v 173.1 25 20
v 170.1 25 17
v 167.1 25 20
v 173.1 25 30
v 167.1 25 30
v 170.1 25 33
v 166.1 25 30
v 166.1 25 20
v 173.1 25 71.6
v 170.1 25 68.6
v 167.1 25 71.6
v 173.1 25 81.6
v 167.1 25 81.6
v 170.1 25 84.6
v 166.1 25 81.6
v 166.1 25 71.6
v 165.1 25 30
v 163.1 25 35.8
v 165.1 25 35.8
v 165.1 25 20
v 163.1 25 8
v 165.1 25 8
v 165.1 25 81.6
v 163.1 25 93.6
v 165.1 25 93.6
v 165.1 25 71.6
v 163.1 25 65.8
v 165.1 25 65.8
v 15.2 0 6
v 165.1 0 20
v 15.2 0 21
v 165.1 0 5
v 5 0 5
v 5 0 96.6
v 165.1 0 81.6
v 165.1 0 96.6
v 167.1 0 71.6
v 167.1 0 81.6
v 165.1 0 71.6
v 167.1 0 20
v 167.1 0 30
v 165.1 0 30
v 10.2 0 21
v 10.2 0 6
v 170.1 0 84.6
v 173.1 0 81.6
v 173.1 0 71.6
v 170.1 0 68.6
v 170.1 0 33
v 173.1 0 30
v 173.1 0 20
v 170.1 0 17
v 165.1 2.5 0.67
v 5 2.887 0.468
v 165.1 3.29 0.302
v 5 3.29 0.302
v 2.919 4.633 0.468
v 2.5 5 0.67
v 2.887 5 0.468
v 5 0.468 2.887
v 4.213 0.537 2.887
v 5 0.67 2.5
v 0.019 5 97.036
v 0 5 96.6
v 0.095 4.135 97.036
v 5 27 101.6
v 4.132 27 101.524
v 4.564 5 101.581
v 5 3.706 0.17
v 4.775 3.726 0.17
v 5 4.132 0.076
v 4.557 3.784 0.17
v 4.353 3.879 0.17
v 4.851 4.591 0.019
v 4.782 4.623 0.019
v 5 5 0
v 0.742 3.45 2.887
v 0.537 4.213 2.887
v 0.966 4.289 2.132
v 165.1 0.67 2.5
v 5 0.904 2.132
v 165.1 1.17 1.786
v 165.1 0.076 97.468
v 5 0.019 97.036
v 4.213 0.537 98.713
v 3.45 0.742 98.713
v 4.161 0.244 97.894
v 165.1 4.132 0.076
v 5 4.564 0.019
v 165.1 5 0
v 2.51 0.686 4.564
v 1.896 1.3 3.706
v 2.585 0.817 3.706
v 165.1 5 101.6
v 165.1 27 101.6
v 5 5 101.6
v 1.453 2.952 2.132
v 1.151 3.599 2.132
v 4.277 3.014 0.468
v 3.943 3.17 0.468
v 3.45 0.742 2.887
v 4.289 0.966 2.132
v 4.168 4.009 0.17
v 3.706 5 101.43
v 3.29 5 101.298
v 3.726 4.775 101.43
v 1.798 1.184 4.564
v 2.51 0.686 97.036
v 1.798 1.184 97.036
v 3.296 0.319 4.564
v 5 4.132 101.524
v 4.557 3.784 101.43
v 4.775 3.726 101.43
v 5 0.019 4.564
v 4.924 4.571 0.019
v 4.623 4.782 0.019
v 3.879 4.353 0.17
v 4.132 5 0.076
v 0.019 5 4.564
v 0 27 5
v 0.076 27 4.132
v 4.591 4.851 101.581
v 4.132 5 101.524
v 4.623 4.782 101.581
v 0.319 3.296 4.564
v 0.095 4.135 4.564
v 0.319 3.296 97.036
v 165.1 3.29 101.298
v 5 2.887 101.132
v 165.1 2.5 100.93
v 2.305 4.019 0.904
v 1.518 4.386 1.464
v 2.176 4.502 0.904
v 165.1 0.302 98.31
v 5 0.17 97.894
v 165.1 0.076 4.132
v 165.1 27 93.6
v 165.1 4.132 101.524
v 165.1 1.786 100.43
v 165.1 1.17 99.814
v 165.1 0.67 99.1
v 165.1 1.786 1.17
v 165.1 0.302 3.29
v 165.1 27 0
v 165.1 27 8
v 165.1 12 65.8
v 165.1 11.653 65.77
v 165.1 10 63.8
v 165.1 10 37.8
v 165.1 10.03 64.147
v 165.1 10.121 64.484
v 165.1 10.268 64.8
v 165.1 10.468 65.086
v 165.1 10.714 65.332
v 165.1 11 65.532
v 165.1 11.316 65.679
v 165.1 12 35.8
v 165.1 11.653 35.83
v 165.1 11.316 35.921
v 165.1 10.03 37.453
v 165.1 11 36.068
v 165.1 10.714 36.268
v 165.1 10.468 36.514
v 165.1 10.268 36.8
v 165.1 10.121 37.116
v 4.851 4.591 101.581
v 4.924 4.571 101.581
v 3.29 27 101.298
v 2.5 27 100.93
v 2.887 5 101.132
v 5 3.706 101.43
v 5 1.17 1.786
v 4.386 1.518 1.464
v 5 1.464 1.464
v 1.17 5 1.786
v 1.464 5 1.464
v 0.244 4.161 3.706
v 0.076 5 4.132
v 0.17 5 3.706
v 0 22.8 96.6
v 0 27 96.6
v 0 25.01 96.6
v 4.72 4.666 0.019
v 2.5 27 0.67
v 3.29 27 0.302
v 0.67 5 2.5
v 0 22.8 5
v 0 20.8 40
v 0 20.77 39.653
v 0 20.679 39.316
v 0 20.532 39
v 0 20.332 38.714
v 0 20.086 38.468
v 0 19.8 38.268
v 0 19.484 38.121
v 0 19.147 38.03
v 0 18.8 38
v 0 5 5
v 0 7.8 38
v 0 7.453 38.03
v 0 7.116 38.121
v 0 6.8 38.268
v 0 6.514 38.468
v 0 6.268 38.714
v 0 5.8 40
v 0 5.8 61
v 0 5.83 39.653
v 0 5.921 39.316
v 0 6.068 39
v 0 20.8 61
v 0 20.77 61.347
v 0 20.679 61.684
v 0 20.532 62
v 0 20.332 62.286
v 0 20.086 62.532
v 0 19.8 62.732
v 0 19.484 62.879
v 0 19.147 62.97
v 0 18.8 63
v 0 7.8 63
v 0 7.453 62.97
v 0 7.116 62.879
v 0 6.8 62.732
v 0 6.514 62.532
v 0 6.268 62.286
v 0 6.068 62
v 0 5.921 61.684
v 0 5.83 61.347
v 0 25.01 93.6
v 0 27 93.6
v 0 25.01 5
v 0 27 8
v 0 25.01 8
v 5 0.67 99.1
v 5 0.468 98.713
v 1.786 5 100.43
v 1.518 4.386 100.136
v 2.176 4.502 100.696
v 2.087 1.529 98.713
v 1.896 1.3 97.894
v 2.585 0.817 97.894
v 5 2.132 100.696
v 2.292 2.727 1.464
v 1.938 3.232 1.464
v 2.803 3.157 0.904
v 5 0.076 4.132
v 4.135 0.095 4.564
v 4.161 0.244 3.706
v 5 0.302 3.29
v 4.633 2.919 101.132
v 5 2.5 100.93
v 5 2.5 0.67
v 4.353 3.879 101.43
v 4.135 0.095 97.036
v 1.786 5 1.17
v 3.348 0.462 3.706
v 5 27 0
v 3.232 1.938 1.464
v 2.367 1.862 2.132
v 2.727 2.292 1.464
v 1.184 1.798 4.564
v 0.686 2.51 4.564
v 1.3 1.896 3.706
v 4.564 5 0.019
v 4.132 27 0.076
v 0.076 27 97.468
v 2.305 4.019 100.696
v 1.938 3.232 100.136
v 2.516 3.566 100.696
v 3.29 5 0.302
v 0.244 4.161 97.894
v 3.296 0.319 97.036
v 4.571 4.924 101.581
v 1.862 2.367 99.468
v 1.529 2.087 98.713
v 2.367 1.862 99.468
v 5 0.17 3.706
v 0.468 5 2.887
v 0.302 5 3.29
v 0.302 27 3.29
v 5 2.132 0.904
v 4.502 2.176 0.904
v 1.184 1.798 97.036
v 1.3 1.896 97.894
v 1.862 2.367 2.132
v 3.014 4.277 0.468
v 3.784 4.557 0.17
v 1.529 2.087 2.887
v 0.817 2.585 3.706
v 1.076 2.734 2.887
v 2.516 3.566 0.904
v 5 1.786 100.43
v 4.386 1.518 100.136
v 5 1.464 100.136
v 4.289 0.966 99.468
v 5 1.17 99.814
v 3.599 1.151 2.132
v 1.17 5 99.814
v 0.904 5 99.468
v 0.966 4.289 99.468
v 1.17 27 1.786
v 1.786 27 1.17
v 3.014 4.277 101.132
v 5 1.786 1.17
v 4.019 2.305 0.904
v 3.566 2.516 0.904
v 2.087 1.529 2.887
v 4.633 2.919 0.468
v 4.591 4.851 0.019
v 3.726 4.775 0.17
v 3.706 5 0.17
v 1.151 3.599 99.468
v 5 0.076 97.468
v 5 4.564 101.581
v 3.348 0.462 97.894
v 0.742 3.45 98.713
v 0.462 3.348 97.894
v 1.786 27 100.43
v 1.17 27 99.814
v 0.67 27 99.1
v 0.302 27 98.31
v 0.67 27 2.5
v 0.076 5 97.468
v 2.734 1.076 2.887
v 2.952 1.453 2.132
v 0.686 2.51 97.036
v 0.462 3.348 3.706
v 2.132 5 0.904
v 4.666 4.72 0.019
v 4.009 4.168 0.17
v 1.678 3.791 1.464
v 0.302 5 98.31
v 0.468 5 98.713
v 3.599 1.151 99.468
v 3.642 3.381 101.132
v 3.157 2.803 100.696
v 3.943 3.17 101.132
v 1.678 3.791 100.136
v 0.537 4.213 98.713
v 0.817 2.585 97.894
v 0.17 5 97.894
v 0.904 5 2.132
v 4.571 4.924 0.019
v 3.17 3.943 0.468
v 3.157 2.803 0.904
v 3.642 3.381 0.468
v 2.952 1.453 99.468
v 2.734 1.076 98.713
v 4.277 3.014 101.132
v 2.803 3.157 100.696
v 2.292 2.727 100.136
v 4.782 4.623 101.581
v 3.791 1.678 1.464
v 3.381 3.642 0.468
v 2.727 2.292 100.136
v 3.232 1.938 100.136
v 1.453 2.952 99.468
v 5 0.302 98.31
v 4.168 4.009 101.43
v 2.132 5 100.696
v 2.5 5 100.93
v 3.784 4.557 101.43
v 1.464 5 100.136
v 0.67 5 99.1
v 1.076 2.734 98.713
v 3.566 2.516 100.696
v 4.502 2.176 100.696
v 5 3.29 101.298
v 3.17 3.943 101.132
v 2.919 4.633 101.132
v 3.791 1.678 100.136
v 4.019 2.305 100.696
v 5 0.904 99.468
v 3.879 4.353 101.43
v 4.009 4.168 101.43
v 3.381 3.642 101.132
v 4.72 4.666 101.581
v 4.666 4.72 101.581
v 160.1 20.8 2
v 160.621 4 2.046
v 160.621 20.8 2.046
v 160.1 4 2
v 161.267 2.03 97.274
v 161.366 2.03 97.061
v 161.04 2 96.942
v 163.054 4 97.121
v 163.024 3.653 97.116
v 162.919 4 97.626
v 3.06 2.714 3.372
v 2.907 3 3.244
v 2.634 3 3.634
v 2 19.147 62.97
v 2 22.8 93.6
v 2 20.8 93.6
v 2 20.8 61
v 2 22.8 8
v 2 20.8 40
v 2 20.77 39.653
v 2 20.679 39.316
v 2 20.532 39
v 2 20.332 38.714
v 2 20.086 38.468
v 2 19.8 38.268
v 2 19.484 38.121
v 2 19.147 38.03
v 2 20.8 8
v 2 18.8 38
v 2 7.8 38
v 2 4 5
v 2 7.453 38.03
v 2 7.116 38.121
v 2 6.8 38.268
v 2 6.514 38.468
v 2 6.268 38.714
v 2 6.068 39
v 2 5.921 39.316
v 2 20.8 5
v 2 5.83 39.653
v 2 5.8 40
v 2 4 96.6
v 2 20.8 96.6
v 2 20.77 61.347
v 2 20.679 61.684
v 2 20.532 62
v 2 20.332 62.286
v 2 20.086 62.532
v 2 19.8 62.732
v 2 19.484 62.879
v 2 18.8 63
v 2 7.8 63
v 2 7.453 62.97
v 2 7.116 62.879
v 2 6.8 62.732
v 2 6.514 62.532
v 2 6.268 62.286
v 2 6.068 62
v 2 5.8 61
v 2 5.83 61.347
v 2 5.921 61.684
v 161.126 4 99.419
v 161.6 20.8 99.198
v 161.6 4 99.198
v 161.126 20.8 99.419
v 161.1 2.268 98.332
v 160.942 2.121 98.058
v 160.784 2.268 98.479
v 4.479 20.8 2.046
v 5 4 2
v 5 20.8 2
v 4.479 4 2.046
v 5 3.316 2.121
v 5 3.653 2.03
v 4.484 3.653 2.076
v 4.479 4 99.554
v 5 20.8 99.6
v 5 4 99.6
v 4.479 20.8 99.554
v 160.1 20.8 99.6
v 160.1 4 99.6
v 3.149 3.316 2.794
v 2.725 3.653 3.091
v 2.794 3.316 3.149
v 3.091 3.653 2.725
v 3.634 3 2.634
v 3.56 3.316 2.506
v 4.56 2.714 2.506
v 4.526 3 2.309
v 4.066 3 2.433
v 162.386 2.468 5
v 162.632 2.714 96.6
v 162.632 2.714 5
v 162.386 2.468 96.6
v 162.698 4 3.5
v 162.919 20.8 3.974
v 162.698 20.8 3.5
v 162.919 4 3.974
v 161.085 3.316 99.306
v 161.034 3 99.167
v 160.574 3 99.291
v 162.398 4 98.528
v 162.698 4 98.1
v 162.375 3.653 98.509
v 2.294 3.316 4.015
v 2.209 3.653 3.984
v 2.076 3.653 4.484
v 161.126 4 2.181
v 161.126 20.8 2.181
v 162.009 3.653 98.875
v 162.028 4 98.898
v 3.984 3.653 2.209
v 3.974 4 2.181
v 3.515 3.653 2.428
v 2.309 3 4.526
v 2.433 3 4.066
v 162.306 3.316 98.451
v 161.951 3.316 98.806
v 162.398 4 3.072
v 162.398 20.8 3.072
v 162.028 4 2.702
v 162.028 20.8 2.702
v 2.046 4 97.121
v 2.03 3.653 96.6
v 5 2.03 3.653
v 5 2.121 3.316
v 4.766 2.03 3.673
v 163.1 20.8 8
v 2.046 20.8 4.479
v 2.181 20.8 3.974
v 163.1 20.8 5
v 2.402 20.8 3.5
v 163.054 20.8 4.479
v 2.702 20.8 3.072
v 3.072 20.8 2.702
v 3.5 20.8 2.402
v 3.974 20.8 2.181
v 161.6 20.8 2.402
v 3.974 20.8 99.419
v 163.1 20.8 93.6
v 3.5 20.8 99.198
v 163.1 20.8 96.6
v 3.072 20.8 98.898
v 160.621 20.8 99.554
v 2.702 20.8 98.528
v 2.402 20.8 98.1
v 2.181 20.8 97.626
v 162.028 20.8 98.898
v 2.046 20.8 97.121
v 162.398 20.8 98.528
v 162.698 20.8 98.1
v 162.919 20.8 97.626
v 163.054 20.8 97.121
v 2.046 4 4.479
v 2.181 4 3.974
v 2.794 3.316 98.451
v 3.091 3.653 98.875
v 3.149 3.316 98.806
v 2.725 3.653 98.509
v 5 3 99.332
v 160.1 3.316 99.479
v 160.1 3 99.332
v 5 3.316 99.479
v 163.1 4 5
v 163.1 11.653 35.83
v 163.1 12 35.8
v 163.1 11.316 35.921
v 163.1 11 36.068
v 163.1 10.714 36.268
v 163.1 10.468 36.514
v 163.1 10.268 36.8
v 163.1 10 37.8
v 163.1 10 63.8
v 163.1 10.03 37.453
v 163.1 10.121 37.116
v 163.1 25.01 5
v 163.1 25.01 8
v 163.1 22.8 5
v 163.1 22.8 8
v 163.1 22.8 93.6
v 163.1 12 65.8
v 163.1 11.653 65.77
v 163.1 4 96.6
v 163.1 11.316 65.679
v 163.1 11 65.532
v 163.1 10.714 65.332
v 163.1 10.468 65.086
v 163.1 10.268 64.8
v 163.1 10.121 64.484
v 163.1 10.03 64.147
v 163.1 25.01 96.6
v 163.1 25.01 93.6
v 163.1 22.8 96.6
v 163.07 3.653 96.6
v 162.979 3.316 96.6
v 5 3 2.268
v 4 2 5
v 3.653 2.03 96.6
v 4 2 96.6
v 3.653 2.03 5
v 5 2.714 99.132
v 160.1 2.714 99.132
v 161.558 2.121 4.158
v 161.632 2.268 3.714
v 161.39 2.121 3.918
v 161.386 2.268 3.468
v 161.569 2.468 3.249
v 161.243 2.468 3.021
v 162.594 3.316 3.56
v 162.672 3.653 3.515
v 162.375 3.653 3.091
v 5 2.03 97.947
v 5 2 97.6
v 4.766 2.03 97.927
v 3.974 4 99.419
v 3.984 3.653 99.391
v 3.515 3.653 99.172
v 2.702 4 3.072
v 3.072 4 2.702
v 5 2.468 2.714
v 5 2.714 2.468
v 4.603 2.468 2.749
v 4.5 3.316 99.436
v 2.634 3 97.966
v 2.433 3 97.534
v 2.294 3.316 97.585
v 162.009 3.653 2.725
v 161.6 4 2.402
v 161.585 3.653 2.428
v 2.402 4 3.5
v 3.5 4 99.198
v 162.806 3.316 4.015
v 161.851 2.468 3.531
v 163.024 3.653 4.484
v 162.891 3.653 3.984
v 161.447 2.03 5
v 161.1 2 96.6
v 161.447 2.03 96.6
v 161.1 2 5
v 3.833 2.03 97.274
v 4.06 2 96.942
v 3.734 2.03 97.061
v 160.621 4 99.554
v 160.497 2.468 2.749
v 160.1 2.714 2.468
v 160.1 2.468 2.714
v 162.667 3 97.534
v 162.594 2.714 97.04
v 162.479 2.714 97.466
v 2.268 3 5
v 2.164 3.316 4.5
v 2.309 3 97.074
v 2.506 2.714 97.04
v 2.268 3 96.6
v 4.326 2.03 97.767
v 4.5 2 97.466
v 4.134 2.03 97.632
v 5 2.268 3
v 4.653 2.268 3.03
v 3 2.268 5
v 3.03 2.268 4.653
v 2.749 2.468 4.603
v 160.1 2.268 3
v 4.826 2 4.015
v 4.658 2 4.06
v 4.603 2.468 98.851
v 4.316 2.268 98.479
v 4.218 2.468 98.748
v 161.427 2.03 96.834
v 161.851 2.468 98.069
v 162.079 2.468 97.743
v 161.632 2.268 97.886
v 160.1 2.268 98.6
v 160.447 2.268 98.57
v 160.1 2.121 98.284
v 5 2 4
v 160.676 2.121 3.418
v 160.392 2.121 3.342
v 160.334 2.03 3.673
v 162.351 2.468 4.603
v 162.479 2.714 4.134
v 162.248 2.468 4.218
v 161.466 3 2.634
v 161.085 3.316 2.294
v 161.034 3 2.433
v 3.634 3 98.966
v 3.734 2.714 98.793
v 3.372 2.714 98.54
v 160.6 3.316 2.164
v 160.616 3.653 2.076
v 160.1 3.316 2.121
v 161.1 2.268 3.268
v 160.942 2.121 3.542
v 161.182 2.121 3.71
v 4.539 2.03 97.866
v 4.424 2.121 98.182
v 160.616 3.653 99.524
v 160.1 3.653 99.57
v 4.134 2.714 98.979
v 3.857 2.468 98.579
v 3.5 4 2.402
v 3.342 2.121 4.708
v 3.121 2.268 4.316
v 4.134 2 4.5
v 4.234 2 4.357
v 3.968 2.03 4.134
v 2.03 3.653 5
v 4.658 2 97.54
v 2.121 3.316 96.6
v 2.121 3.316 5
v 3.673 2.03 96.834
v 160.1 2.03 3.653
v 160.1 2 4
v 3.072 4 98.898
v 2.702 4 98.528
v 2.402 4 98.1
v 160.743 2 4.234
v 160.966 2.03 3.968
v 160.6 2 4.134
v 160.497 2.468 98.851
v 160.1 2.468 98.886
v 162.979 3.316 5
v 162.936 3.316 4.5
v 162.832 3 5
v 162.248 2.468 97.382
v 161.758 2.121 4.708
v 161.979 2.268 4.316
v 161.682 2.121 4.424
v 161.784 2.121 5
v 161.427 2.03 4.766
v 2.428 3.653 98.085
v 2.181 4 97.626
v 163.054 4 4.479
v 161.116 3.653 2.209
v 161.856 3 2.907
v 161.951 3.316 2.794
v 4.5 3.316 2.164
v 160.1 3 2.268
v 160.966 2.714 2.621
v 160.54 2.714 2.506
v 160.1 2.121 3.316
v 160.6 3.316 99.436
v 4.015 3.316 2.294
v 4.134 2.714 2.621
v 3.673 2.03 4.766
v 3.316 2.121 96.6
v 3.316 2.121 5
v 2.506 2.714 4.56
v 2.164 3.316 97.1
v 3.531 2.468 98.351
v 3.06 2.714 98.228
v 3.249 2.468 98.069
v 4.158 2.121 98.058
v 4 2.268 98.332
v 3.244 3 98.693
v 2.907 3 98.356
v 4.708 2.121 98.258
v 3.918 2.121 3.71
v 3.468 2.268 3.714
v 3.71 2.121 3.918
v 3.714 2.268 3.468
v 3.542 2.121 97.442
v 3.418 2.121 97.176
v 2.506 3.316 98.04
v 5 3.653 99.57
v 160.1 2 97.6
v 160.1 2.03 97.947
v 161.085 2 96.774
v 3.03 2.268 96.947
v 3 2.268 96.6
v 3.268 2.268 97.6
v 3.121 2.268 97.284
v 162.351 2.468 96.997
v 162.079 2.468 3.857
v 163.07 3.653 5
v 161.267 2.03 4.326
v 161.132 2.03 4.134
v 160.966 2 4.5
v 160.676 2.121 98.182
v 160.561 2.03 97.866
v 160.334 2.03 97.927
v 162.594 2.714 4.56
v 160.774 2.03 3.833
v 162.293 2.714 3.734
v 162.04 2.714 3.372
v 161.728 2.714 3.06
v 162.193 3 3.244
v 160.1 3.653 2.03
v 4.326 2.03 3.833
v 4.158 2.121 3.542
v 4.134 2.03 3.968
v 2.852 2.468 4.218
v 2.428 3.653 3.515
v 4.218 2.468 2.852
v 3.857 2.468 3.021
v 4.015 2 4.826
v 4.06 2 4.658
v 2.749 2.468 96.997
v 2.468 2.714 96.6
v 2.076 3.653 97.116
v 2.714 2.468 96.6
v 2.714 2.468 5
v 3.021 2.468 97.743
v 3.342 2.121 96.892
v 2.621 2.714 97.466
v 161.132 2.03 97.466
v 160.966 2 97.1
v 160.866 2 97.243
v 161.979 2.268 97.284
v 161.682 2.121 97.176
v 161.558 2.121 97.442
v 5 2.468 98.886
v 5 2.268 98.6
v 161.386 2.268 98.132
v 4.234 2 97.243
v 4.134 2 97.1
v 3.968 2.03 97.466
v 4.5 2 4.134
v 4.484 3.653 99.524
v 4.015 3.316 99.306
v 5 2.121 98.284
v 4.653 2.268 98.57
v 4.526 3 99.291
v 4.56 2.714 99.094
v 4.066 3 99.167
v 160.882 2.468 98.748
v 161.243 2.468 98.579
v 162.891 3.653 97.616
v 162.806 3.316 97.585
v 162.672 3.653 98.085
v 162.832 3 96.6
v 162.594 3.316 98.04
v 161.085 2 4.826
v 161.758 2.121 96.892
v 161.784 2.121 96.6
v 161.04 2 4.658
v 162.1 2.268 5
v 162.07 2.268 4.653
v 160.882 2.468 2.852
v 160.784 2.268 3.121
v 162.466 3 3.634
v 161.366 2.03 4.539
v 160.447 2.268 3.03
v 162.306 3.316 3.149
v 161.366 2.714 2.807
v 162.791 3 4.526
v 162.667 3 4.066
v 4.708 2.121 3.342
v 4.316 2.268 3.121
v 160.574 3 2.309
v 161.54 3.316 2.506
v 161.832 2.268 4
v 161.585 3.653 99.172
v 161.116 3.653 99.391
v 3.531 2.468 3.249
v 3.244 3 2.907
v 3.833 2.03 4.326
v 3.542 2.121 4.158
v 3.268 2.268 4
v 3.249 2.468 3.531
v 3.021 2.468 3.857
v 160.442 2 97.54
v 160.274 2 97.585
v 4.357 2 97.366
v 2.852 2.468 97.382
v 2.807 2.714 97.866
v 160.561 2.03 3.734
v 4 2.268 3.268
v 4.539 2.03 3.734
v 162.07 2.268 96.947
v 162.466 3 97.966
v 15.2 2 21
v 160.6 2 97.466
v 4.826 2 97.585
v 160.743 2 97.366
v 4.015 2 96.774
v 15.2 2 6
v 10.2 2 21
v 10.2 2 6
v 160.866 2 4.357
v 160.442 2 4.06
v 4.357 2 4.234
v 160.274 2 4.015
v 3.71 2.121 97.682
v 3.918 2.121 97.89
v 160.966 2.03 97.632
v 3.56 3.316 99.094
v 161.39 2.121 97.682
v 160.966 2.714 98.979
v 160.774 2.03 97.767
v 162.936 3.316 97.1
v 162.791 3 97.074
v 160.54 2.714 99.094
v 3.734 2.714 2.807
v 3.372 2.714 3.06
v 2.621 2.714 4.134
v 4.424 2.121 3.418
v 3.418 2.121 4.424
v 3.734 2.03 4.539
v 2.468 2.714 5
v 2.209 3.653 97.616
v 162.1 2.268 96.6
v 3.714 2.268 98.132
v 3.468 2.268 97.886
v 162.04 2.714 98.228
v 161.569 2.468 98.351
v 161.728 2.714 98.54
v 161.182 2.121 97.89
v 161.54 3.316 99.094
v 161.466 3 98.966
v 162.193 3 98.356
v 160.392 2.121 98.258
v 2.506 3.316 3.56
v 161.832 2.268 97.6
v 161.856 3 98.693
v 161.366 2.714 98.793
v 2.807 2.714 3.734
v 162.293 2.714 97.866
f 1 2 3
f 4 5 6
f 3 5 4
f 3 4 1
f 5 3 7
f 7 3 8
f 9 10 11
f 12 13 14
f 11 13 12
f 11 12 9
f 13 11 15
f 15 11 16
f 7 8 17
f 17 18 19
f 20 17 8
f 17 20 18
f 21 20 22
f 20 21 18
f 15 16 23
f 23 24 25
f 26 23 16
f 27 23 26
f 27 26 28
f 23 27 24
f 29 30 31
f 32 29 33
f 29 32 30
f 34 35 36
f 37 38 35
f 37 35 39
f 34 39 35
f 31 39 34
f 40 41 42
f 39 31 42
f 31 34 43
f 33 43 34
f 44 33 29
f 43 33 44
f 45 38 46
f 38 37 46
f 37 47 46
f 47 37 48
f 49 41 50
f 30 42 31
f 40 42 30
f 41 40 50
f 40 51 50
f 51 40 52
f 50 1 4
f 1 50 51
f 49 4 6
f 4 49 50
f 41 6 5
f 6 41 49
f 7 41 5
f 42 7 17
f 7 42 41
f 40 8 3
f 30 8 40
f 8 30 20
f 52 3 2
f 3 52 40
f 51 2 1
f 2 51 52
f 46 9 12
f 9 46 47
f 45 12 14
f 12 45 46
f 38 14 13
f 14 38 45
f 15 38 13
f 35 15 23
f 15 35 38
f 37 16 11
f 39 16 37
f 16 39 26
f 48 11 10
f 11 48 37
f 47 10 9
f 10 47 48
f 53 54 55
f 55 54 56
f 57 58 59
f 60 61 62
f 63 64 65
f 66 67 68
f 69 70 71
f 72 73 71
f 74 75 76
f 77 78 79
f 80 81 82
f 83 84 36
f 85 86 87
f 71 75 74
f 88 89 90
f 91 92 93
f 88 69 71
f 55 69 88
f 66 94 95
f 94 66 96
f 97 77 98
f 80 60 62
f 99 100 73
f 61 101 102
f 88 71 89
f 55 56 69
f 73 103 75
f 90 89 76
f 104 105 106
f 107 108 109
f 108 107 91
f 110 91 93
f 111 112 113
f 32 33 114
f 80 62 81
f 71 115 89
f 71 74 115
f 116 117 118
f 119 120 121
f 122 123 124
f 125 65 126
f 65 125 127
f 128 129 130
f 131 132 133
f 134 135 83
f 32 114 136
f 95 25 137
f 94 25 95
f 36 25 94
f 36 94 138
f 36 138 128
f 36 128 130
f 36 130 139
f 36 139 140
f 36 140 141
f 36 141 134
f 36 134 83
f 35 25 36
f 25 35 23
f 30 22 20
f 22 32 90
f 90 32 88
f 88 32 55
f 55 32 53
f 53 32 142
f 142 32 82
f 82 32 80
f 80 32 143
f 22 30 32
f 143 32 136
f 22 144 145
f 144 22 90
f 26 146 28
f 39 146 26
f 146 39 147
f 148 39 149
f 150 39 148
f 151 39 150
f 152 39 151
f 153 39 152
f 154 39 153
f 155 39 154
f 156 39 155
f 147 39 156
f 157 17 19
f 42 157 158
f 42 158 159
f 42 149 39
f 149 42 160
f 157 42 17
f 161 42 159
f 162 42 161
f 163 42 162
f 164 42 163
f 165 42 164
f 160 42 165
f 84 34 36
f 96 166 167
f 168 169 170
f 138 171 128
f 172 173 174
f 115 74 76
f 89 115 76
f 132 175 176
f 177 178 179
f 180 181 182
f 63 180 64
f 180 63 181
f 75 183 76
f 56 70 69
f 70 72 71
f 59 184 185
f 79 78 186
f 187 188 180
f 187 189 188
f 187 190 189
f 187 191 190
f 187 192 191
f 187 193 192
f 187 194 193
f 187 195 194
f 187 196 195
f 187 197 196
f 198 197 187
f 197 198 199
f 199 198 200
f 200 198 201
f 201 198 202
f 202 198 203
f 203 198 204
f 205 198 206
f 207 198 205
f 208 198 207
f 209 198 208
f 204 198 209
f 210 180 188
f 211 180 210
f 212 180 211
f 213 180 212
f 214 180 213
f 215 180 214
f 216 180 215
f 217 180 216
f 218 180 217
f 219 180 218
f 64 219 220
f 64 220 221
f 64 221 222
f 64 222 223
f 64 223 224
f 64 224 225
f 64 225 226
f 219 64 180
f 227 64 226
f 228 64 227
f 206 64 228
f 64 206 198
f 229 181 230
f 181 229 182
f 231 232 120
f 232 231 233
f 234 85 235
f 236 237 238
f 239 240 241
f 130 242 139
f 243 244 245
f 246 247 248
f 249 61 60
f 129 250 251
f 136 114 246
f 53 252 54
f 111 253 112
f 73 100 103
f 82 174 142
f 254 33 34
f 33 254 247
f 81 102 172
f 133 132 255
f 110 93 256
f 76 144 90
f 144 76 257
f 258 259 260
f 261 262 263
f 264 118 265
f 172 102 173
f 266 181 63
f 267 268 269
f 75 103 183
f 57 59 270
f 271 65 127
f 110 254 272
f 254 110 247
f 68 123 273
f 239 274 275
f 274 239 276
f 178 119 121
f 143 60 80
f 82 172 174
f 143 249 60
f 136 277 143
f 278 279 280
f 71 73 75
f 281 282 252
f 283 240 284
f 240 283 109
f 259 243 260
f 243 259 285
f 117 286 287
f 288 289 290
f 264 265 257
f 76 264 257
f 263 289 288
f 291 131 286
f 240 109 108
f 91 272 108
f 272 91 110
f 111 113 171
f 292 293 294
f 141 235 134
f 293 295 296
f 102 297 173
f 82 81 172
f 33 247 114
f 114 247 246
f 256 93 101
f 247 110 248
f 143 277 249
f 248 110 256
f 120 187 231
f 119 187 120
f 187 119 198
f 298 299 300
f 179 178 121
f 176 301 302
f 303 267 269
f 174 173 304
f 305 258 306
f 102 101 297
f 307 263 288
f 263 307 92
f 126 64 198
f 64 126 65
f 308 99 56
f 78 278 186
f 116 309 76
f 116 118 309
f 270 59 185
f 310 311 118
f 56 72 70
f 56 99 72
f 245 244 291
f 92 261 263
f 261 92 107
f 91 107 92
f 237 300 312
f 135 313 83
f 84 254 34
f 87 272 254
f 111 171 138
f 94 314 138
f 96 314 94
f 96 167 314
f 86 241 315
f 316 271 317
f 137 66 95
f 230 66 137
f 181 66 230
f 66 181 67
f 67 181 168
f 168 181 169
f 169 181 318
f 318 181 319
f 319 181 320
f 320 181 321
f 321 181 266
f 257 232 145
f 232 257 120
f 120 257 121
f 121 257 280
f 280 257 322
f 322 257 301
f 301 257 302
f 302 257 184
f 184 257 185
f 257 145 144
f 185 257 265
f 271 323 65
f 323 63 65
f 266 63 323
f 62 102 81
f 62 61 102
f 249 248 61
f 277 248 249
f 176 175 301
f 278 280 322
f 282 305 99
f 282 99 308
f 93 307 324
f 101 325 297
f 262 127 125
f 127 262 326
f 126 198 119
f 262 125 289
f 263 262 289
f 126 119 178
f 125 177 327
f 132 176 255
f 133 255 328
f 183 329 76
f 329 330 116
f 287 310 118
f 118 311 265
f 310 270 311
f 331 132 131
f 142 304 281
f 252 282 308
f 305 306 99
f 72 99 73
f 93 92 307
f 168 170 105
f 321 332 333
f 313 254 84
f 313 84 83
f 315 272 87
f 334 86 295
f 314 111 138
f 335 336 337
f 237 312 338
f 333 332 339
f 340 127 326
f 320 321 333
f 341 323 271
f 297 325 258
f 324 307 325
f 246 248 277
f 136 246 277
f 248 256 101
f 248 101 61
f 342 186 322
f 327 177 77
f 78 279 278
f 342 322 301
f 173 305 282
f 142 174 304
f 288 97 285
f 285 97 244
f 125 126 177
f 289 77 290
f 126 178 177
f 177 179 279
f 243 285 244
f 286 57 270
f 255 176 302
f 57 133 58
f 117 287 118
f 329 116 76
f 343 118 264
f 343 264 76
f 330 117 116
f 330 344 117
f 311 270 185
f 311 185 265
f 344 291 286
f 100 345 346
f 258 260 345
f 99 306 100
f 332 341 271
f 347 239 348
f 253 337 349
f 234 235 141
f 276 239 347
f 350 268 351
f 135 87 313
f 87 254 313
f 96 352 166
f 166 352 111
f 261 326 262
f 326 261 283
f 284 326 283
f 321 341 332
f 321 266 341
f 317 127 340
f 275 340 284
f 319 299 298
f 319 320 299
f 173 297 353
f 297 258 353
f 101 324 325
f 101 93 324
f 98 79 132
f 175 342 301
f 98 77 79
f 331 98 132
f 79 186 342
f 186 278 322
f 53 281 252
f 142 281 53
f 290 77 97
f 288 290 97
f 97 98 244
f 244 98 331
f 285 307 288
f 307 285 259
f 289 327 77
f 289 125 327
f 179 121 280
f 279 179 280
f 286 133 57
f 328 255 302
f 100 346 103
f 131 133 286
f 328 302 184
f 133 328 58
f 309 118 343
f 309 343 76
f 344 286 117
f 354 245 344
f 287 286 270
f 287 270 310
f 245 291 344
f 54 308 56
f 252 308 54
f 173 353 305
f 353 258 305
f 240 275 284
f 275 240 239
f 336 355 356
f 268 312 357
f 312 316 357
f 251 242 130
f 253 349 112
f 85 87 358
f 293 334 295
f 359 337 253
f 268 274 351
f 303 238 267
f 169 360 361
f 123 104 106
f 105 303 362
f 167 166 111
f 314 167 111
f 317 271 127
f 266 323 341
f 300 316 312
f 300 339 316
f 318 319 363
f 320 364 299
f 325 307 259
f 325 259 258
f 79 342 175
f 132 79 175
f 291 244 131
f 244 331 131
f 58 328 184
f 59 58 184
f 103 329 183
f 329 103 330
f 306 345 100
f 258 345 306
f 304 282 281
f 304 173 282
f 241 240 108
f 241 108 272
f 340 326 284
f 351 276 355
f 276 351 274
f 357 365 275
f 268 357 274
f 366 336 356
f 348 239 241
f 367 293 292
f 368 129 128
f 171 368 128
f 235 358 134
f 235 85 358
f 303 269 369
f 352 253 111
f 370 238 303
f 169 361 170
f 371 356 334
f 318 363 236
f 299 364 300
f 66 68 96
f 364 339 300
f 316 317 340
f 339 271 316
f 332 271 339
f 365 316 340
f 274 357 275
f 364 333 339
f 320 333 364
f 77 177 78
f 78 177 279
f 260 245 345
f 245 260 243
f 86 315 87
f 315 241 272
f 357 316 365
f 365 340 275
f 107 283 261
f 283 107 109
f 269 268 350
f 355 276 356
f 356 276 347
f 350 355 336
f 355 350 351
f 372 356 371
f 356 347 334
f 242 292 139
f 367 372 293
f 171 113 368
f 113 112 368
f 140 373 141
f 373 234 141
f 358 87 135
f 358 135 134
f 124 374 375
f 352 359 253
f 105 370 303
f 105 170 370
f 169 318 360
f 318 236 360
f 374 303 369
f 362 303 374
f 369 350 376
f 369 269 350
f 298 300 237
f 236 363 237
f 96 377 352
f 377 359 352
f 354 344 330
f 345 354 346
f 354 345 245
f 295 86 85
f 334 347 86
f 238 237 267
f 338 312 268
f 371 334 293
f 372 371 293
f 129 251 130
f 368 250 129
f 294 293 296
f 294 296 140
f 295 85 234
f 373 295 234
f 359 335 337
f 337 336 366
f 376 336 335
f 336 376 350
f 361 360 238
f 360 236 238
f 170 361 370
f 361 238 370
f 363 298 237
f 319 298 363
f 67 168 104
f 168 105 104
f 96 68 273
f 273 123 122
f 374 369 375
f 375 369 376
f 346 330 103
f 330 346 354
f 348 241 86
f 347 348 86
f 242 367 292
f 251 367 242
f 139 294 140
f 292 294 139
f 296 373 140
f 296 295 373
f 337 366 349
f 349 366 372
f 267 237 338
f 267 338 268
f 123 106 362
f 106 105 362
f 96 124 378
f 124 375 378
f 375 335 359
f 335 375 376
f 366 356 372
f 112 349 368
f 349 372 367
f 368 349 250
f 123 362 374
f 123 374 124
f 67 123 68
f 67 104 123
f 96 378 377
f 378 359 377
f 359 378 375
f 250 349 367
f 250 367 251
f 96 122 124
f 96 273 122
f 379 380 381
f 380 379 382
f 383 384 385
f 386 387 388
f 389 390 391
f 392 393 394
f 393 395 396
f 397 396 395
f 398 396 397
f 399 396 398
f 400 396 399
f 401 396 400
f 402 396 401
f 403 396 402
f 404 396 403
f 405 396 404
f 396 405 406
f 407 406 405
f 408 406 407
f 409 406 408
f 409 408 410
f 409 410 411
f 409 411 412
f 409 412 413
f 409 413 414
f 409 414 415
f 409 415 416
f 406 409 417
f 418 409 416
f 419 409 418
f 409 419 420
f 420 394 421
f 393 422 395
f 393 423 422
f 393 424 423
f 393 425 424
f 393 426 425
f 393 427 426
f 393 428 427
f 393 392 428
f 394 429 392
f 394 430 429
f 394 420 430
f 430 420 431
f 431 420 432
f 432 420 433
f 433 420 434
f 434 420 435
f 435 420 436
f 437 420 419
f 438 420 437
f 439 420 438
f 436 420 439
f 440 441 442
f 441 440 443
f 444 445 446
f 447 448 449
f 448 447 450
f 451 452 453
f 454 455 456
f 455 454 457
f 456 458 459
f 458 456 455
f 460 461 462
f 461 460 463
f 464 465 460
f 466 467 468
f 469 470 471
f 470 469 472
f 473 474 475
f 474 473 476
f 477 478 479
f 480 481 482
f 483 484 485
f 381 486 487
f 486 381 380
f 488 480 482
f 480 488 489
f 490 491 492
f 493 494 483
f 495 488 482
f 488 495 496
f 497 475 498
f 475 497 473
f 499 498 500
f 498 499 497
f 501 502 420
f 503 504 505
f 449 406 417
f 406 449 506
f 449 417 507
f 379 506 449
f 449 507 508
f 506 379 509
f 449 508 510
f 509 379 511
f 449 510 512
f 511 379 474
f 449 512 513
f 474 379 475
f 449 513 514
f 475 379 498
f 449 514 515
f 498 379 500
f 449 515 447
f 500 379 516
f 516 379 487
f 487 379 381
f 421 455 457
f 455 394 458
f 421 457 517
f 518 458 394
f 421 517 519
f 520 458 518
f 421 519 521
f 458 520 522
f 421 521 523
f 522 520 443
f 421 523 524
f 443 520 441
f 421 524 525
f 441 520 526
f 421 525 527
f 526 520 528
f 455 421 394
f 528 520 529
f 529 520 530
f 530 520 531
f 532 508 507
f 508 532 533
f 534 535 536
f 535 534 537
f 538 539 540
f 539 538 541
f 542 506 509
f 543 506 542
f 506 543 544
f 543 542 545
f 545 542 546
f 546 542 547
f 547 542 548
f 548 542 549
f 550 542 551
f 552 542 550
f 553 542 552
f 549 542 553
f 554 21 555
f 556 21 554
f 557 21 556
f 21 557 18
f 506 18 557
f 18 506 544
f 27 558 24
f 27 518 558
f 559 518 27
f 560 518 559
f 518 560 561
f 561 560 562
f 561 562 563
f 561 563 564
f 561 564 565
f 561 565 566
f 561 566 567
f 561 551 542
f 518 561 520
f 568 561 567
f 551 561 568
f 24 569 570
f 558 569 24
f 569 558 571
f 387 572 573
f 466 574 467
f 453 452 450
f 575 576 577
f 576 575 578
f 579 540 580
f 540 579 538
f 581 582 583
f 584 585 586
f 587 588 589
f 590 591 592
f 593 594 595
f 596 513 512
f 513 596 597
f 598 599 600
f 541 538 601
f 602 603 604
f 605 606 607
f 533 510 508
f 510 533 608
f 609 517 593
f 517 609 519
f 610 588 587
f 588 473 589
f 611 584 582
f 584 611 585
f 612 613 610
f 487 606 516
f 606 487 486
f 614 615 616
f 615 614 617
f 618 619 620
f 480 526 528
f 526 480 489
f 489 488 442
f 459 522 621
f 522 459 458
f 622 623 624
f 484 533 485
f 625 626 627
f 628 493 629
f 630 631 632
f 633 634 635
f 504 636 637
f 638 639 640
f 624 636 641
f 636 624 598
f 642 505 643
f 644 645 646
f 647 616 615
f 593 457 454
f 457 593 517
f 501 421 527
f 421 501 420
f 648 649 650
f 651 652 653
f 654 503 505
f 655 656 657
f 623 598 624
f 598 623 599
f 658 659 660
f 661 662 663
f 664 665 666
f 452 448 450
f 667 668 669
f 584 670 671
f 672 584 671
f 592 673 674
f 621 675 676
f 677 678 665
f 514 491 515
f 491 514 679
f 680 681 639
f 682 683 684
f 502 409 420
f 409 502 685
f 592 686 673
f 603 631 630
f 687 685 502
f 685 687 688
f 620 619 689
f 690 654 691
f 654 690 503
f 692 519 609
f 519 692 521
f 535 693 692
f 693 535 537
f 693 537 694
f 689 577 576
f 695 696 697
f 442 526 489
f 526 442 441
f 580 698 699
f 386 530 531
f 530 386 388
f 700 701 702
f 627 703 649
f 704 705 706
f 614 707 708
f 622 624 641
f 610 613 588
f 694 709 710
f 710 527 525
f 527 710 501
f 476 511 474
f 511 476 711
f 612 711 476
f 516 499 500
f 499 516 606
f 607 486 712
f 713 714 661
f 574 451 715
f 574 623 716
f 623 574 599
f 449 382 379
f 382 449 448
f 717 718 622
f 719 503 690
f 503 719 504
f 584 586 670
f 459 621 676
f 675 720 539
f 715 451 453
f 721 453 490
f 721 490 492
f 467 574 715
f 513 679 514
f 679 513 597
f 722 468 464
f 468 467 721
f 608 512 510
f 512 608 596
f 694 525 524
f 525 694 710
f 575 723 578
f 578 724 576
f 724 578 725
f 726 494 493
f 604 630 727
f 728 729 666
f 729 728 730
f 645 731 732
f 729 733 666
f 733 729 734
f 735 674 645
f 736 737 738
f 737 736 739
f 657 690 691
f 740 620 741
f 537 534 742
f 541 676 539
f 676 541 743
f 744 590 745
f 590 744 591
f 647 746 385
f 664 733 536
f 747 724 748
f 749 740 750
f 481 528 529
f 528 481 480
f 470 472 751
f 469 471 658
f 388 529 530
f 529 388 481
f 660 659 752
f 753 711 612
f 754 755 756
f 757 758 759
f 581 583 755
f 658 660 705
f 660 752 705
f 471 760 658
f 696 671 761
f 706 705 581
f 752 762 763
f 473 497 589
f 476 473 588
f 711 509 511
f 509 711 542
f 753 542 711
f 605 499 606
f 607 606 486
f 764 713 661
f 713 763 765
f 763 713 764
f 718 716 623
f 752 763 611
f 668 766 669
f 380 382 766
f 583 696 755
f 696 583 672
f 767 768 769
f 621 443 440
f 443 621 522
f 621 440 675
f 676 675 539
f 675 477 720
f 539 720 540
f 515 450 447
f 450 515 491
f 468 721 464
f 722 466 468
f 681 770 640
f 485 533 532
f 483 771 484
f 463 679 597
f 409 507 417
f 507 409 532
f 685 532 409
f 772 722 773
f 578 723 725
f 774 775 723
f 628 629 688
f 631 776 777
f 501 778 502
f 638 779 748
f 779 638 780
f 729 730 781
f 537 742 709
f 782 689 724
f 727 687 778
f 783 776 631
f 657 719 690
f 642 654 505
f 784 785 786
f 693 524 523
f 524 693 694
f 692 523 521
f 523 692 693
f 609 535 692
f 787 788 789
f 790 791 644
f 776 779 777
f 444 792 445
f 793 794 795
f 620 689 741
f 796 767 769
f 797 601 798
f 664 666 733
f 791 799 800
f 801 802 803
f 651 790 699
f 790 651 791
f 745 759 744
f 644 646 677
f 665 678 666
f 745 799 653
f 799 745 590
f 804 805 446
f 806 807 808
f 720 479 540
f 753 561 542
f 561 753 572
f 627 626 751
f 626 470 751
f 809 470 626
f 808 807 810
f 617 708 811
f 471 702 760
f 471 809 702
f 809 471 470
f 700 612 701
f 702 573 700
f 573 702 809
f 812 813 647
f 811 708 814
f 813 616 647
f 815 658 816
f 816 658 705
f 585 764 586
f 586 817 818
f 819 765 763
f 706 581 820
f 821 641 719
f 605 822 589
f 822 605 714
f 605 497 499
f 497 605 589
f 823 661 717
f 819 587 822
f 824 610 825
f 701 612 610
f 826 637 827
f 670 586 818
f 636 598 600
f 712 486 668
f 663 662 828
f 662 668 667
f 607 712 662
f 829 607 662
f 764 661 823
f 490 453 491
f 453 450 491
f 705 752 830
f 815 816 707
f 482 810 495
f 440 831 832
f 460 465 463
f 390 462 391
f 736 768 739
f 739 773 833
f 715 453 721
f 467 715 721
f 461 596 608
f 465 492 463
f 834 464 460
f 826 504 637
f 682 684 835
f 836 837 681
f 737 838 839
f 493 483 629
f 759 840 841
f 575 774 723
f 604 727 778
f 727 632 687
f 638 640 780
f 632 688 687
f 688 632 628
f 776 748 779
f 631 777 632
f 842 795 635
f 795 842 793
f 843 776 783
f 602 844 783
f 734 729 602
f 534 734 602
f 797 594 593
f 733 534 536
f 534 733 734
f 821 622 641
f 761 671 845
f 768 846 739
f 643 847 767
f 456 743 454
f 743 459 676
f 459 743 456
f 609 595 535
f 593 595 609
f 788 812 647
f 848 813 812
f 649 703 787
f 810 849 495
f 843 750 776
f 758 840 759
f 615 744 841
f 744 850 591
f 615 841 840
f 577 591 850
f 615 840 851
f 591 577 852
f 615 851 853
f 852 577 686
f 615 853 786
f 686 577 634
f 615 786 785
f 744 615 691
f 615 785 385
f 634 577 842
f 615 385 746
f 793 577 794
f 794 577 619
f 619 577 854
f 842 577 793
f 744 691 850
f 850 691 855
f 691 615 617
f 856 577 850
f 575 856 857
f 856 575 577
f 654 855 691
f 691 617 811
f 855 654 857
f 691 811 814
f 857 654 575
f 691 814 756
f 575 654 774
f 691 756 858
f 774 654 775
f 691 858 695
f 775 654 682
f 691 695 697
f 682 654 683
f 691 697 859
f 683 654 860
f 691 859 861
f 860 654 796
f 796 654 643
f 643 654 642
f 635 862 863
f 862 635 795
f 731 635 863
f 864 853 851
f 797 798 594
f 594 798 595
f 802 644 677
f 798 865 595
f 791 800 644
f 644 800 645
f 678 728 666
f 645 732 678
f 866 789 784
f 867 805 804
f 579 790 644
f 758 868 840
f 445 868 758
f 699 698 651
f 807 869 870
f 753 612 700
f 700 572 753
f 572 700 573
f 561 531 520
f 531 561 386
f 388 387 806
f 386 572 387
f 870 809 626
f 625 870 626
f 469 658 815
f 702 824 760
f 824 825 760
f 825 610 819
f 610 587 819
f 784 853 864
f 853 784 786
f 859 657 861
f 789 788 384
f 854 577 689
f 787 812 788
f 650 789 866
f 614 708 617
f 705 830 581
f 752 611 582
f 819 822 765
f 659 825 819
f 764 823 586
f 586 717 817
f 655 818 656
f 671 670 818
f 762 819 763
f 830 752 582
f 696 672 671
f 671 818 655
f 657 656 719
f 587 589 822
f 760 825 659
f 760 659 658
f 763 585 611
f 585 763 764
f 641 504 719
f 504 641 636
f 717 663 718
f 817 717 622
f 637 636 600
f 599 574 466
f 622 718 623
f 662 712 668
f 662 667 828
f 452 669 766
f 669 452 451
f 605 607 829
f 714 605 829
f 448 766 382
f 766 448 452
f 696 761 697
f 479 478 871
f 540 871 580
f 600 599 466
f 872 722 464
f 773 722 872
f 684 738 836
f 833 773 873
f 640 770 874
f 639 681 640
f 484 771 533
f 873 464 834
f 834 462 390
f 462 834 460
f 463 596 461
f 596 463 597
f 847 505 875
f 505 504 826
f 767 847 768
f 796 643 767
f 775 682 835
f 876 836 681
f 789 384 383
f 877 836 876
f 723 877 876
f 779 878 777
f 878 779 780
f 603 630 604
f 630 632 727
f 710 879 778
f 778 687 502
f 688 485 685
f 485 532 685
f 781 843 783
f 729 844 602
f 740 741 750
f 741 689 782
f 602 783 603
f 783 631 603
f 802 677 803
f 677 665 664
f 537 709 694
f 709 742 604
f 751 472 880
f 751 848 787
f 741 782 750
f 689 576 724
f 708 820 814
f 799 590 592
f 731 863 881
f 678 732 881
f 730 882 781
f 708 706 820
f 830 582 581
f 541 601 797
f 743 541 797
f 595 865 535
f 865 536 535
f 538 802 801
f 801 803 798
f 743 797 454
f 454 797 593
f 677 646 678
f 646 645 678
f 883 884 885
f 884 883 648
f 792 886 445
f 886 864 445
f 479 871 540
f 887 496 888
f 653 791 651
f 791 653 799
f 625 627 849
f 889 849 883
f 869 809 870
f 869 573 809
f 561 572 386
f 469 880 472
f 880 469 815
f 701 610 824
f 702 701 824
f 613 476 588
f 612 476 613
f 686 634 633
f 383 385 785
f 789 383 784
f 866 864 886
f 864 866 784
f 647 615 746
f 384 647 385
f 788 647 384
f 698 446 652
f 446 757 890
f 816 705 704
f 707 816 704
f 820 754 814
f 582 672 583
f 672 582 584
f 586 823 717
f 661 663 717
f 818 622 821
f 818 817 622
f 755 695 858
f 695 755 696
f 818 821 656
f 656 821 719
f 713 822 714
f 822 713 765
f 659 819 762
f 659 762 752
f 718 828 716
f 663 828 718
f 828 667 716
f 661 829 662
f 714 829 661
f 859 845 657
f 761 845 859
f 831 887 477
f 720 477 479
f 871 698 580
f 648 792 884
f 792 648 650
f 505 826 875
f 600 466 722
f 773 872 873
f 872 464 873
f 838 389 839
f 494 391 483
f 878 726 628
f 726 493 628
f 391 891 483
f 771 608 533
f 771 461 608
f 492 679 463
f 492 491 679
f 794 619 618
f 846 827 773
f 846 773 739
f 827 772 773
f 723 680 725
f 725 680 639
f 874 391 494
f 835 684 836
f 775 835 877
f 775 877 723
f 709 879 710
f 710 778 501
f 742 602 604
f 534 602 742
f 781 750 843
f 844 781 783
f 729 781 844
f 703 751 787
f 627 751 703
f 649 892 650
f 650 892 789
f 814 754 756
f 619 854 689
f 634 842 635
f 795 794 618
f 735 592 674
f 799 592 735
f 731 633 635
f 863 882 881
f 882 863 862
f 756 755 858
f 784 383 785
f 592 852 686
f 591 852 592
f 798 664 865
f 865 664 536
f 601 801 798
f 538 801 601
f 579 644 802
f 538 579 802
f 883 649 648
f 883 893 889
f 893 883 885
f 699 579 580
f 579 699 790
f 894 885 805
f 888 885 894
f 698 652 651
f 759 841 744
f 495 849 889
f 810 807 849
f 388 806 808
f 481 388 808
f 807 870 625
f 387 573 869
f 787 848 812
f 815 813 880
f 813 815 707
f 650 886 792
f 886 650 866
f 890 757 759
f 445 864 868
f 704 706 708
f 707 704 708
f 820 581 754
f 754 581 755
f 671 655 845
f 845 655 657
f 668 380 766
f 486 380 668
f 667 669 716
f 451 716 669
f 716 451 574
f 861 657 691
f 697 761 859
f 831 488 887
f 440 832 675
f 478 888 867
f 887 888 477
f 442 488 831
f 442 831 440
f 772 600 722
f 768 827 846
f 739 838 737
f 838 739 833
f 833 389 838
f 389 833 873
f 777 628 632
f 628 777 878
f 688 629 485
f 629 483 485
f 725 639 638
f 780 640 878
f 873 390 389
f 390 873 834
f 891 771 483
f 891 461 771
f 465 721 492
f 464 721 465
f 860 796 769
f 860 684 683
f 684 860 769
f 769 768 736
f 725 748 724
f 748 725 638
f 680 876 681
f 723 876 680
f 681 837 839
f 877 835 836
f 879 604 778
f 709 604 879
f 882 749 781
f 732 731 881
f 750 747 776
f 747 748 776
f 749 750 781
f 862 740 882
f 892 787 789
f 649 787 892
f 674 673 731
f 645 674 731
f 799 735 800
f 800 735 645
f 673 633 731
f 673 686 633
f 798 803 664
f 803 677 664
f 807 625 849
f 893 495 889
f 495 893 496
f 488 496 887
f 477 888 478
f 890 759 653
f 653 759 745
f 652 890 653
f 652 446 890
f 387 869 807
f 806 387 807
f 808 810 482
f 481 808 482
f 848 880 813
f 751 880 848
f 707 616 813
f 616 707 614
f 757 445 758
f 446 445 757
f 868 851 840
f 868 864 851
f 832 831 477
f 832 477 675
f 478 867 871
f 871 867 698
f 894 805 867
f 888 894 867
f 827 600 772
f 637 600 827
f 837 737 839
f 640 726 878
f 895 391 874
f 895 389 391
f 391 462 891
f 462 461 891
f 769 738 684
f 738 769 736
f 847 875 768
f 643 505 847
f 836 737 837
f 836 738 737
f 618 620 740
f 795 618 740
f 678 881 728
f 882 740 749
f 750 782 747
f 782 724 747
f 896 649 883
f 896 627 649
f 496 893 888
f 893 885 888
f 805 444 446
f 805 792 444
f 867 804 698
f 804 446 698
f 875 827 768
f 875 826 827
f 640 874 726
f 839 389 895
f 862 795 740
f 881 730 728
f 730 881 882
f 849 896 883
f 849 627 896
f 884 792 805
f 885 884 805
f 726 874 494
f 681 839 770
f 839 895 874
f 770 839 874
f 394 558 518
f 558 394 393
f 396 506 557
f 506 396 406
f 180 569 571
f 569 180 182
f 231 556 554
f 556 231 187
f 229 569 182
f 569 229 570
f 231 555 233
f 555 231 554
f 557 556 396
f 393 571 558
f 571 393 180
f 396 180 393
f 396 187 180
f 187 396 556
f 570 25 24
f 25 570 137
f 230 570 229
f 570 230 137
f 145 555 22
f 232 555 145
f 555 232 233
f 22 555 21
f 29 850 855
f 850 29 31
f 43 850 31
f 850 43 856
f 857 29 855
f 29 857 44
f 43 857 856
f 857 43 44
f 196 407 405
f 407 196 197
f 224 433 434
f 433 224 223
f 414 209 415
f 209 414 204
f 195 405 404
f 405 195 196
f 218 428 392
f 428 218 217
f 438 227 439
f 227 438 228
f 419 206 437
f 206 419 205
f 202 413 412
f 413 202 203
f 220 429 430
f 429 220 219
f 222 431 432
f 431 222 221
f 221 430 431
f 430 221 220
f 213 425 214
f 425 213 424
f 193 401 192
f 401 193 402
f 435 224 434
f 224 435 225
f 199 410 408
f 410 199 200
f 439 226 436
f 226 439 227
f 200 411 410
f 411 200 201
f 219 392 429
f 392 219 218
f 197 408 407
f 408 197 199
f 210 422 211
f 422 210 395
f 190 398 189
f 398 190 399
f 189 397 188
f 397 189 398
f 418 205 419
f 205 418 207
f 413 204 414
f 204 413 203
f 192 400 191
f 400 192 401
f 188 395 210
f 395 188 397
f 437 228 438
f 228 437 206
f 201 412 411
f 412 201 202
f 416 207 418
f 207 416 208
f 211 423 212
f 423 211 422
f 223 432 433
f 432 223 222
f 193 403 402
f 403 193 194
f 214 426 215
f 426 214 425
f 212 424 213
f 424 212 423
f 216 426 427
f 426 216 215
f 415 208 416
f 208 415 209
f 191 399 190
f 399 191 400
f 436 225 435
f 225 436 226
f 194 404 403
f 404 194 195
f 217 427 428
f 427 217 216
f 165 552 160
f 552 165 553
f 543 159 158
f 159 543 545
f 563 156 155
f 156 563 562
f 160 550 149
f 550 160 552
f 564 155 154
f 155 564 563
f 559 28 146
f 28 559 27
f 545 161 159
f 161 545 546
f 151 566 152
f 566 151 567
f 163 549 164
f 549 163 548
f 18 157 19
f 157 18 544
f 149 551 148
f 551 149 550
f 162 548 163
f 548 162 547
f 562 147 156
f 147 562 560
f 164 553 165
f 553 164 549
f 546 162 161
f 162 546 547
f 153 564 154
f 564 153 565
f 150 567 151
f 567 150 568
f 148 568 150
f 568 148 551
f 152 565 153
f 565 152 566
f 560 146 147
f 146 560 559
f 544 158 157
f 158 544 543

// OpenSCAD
// Side box (SolidWorks part 001), left/original copy. Holds one IR proximity
// sensor that reads through the window in the front face. The back door slides
// in from the open left end along the top/bottom grooves; the right end joins
// the center body with two dovetail tabs and a wire notch.
// Frame: X = width (left->right seen from the front), Y = depth (0 = front,
// facing the coffee pots; 27 = back/wall side), Z = height.

side_w = 165.1;          // box width (without joint tabs)
side_d = 27.0;           // box depth
side_h = 101.6;          // box height
side_r = 5.0;            // outer fillet on the front edges and the left end edges
side_wall = 2.0;         // wall thickness (front, top, bottom, left, right)
side_in_r_front = 2.0;   // inner fillet where the cavity meets the front wall
side_in_r_corner = 3.0;  // inner fillet on the cavity's X-Z corners (edges along Y)
side_fn = 36;            // facets per circle (the STL uses 36, i.e. 10 deg steps)

// Back: rail, door groove, lip (same at bottom and top, mirrored)
side_rail_y = 20.8;      // inner face of the rail (= back end of the rounded cavity)
side_rail_t = 2.0;       // rail thickness (Y)
side_rail_h = 8.0;       // rail/lip height from the outer bottom (top/bottom face)
side_groove_t = 2.2;     // door groove width (Y), 22.8..25
side_groove_h = 5.0;     // groove floor height from the outer bottom (3 deep into the 8 high rail)
side_lip_y = 25.0;       // back lip starts here (25..27); right wall also stops here

// Sensor window (front face, sharp rectangle straight through)
side_win_x = 10.2;
side_win_z = 6.0;
side_win_w = 5.0;
side_win_h = 15.0;

// Wire hole (left end wall, rounded rectangle)
side_wire_y = 5.8;
side_wire_z = 38.0;      // was 37.28 in SolidWorks; rounded to 1 mm, about centered (hole 38..63, box mid-height 50.8)
side_wire_w = 15.0;      // along Y (5.8..20.8)
side_wire_h = 25.0;      // along Z
side_wire_r = 2.0;

// Right-end notch (pass-through to the center body, open at the back)
side_notch_y = 10.0;     // notch runs from here to the back of the right wall
side_notch_z = 35.8;
side_notch_h = 30.0;
side_notch_r = 2.0;      // fillet on the two front corners

// Joint tabs (dovetail-like arrows on the right end, full depth 0..25)
side_tab_z = [20.0, 71.6]; // bottom of each tab's root
side_tab_root = 10.0;      // root height at the box face
side_tab_neck = 2.0;       // straight neck length before the flare
side_tab_flare = 3.0;      // flare: 45 deg out by 3 then 45 deg back in by 3
side_tab_len = 8.0;        // total tab length (165.1 -> 173.1)
side_tab_d = 25.0;         // tab depth (Y)

// Outer shell: R5 on the front edges and the left-end edges, square at right/back
module side_outer() {
  r = side_r;
  hull() {
    for (z = [r, side_h - r]) {
      translate([r, r, z]) sphere(r);
      translate([r, r, z]) rotate([0, 90, 0]) cylinder(r = r, h = side_w - r);   // front edges along X
      translate([r, r, z]) rotate([-90, 0, 0]) cylinder(r = r, h = side_d - r);  // left edges along Y
    }
    translate([r, r, 0]) cube([side_w - r, side_d - r, side_h]);
  }
}

// Main cavity: R2 where it meets the front wall, R3 on the X-Z corners.
// Hull of four corner pieces: a half torus (front R2 fillet swept around the
// R3 corner) plus an R3 cylinder running back to the rails.
module side_cavity() {
  rf = side_in_r_front;
  rc = side_in_r_corner - rf;
  x0 = side_wall + side_in_r_corner;
  z0 = side_wall + side_in_r_corner;
  hull()
    for (cx = [x0, side_w - x0], cz = [z0, side_h - z0])
      translate([cx, side_wall + rf, cz]) rotate([-90, 0, 0]) {
        rotate_extrude()
          intersection() {
            translate([rc, 0]) circle(rf);
            translate([0, -rf]) square([rc + rf, rf]);
          }
        cylinder(r = side_in_r_corner, h = side_rail_y - side_wall - rf);
      }
}

module side_box() {
  $fn = side_fn;
  e = 0.01;
  difference() {
    union() {
      side_outer();
      // Joint tabs
      for (z0 = side_tab_z)
        translate([0, side_tab_d, 0]) rotate([90, 0, 0])
          linear_extrude(side_tab_d)
            polygon([
              [side_w - e, z0],
              [side_w + side_tab_neck, z0],
              [side_w + side_tab_neck + side_tab_flare, z0 - side_tab_flare],
              [side_w + side_tab_len, z0],
              [side_w + side_tab_len, z0 + side_tab_root],
              [side_w + side_tab_neck + side_tab_flare, z0 + side_tab_root + side_tab_flare],
              [side_w + side_tab_neck, z0 + side_tab_root],
              [side_w - e, z0 + side_tab_root]]);
    }
    // Rounded cavity (front part, up to the rails)
    side_cavity();
    // Between the rails (behind the cavity)
    translate([side_wall, side_rail_y - e, side_rail_h])
      cube([side_w - 2 * side_wall, side_rail_t + 2 * e, side_h - 2 * side_rail_h]);
    // Door grooves + slot, open through the left end
    translate([-1, side_rail_y + side_rail_t, side_groove_h])
      cube([side_w - side_wall + 1, side_groove_t + e, side_h - 2 * side_groove_h]);
    // Behind the grooves: open between the lips, right wall stops at Y=25
    translate([-1, side_lip_y, side_rail_h])
      cube([side_w + 2, side_d, side_h - 2 * side_rail_h]);
    // Sensor window
    translate([side_win_x, -1, side_win_z]) cube([side_win_w, side_wall + 2, side_win_h]);
    // Wire hole in the left end wall
    translate([-1, 0, 0]) rotate([90, 0, 90]) linear_extrude(side_wall + 2)
      translate([side_wire_y, side_wire_z])
        offset(r = side_wire_r) offset(delta = -side_wire_r) square([side_wire_w, side_wire_h]);
    // Notch in the right end wall (rounded front corners, open at the back)
    translate([side_w - side_wall - 1, 0, 0]) rotate([90, 0, 90]) linear_extrude(side_wall + 2)
      translate([side_notch_y, side_notch_z]) hull() {
        translate([side_notch_r, side_notch_r]) circle(side_notch_r);
        translate([side_notch_r, side_notch_h - side_notch_r]) circle(side_notch_r);
        translate([side_notch_r, 0]) square([side_d, side_notch_h]);
      }
  }
}

side_box();
